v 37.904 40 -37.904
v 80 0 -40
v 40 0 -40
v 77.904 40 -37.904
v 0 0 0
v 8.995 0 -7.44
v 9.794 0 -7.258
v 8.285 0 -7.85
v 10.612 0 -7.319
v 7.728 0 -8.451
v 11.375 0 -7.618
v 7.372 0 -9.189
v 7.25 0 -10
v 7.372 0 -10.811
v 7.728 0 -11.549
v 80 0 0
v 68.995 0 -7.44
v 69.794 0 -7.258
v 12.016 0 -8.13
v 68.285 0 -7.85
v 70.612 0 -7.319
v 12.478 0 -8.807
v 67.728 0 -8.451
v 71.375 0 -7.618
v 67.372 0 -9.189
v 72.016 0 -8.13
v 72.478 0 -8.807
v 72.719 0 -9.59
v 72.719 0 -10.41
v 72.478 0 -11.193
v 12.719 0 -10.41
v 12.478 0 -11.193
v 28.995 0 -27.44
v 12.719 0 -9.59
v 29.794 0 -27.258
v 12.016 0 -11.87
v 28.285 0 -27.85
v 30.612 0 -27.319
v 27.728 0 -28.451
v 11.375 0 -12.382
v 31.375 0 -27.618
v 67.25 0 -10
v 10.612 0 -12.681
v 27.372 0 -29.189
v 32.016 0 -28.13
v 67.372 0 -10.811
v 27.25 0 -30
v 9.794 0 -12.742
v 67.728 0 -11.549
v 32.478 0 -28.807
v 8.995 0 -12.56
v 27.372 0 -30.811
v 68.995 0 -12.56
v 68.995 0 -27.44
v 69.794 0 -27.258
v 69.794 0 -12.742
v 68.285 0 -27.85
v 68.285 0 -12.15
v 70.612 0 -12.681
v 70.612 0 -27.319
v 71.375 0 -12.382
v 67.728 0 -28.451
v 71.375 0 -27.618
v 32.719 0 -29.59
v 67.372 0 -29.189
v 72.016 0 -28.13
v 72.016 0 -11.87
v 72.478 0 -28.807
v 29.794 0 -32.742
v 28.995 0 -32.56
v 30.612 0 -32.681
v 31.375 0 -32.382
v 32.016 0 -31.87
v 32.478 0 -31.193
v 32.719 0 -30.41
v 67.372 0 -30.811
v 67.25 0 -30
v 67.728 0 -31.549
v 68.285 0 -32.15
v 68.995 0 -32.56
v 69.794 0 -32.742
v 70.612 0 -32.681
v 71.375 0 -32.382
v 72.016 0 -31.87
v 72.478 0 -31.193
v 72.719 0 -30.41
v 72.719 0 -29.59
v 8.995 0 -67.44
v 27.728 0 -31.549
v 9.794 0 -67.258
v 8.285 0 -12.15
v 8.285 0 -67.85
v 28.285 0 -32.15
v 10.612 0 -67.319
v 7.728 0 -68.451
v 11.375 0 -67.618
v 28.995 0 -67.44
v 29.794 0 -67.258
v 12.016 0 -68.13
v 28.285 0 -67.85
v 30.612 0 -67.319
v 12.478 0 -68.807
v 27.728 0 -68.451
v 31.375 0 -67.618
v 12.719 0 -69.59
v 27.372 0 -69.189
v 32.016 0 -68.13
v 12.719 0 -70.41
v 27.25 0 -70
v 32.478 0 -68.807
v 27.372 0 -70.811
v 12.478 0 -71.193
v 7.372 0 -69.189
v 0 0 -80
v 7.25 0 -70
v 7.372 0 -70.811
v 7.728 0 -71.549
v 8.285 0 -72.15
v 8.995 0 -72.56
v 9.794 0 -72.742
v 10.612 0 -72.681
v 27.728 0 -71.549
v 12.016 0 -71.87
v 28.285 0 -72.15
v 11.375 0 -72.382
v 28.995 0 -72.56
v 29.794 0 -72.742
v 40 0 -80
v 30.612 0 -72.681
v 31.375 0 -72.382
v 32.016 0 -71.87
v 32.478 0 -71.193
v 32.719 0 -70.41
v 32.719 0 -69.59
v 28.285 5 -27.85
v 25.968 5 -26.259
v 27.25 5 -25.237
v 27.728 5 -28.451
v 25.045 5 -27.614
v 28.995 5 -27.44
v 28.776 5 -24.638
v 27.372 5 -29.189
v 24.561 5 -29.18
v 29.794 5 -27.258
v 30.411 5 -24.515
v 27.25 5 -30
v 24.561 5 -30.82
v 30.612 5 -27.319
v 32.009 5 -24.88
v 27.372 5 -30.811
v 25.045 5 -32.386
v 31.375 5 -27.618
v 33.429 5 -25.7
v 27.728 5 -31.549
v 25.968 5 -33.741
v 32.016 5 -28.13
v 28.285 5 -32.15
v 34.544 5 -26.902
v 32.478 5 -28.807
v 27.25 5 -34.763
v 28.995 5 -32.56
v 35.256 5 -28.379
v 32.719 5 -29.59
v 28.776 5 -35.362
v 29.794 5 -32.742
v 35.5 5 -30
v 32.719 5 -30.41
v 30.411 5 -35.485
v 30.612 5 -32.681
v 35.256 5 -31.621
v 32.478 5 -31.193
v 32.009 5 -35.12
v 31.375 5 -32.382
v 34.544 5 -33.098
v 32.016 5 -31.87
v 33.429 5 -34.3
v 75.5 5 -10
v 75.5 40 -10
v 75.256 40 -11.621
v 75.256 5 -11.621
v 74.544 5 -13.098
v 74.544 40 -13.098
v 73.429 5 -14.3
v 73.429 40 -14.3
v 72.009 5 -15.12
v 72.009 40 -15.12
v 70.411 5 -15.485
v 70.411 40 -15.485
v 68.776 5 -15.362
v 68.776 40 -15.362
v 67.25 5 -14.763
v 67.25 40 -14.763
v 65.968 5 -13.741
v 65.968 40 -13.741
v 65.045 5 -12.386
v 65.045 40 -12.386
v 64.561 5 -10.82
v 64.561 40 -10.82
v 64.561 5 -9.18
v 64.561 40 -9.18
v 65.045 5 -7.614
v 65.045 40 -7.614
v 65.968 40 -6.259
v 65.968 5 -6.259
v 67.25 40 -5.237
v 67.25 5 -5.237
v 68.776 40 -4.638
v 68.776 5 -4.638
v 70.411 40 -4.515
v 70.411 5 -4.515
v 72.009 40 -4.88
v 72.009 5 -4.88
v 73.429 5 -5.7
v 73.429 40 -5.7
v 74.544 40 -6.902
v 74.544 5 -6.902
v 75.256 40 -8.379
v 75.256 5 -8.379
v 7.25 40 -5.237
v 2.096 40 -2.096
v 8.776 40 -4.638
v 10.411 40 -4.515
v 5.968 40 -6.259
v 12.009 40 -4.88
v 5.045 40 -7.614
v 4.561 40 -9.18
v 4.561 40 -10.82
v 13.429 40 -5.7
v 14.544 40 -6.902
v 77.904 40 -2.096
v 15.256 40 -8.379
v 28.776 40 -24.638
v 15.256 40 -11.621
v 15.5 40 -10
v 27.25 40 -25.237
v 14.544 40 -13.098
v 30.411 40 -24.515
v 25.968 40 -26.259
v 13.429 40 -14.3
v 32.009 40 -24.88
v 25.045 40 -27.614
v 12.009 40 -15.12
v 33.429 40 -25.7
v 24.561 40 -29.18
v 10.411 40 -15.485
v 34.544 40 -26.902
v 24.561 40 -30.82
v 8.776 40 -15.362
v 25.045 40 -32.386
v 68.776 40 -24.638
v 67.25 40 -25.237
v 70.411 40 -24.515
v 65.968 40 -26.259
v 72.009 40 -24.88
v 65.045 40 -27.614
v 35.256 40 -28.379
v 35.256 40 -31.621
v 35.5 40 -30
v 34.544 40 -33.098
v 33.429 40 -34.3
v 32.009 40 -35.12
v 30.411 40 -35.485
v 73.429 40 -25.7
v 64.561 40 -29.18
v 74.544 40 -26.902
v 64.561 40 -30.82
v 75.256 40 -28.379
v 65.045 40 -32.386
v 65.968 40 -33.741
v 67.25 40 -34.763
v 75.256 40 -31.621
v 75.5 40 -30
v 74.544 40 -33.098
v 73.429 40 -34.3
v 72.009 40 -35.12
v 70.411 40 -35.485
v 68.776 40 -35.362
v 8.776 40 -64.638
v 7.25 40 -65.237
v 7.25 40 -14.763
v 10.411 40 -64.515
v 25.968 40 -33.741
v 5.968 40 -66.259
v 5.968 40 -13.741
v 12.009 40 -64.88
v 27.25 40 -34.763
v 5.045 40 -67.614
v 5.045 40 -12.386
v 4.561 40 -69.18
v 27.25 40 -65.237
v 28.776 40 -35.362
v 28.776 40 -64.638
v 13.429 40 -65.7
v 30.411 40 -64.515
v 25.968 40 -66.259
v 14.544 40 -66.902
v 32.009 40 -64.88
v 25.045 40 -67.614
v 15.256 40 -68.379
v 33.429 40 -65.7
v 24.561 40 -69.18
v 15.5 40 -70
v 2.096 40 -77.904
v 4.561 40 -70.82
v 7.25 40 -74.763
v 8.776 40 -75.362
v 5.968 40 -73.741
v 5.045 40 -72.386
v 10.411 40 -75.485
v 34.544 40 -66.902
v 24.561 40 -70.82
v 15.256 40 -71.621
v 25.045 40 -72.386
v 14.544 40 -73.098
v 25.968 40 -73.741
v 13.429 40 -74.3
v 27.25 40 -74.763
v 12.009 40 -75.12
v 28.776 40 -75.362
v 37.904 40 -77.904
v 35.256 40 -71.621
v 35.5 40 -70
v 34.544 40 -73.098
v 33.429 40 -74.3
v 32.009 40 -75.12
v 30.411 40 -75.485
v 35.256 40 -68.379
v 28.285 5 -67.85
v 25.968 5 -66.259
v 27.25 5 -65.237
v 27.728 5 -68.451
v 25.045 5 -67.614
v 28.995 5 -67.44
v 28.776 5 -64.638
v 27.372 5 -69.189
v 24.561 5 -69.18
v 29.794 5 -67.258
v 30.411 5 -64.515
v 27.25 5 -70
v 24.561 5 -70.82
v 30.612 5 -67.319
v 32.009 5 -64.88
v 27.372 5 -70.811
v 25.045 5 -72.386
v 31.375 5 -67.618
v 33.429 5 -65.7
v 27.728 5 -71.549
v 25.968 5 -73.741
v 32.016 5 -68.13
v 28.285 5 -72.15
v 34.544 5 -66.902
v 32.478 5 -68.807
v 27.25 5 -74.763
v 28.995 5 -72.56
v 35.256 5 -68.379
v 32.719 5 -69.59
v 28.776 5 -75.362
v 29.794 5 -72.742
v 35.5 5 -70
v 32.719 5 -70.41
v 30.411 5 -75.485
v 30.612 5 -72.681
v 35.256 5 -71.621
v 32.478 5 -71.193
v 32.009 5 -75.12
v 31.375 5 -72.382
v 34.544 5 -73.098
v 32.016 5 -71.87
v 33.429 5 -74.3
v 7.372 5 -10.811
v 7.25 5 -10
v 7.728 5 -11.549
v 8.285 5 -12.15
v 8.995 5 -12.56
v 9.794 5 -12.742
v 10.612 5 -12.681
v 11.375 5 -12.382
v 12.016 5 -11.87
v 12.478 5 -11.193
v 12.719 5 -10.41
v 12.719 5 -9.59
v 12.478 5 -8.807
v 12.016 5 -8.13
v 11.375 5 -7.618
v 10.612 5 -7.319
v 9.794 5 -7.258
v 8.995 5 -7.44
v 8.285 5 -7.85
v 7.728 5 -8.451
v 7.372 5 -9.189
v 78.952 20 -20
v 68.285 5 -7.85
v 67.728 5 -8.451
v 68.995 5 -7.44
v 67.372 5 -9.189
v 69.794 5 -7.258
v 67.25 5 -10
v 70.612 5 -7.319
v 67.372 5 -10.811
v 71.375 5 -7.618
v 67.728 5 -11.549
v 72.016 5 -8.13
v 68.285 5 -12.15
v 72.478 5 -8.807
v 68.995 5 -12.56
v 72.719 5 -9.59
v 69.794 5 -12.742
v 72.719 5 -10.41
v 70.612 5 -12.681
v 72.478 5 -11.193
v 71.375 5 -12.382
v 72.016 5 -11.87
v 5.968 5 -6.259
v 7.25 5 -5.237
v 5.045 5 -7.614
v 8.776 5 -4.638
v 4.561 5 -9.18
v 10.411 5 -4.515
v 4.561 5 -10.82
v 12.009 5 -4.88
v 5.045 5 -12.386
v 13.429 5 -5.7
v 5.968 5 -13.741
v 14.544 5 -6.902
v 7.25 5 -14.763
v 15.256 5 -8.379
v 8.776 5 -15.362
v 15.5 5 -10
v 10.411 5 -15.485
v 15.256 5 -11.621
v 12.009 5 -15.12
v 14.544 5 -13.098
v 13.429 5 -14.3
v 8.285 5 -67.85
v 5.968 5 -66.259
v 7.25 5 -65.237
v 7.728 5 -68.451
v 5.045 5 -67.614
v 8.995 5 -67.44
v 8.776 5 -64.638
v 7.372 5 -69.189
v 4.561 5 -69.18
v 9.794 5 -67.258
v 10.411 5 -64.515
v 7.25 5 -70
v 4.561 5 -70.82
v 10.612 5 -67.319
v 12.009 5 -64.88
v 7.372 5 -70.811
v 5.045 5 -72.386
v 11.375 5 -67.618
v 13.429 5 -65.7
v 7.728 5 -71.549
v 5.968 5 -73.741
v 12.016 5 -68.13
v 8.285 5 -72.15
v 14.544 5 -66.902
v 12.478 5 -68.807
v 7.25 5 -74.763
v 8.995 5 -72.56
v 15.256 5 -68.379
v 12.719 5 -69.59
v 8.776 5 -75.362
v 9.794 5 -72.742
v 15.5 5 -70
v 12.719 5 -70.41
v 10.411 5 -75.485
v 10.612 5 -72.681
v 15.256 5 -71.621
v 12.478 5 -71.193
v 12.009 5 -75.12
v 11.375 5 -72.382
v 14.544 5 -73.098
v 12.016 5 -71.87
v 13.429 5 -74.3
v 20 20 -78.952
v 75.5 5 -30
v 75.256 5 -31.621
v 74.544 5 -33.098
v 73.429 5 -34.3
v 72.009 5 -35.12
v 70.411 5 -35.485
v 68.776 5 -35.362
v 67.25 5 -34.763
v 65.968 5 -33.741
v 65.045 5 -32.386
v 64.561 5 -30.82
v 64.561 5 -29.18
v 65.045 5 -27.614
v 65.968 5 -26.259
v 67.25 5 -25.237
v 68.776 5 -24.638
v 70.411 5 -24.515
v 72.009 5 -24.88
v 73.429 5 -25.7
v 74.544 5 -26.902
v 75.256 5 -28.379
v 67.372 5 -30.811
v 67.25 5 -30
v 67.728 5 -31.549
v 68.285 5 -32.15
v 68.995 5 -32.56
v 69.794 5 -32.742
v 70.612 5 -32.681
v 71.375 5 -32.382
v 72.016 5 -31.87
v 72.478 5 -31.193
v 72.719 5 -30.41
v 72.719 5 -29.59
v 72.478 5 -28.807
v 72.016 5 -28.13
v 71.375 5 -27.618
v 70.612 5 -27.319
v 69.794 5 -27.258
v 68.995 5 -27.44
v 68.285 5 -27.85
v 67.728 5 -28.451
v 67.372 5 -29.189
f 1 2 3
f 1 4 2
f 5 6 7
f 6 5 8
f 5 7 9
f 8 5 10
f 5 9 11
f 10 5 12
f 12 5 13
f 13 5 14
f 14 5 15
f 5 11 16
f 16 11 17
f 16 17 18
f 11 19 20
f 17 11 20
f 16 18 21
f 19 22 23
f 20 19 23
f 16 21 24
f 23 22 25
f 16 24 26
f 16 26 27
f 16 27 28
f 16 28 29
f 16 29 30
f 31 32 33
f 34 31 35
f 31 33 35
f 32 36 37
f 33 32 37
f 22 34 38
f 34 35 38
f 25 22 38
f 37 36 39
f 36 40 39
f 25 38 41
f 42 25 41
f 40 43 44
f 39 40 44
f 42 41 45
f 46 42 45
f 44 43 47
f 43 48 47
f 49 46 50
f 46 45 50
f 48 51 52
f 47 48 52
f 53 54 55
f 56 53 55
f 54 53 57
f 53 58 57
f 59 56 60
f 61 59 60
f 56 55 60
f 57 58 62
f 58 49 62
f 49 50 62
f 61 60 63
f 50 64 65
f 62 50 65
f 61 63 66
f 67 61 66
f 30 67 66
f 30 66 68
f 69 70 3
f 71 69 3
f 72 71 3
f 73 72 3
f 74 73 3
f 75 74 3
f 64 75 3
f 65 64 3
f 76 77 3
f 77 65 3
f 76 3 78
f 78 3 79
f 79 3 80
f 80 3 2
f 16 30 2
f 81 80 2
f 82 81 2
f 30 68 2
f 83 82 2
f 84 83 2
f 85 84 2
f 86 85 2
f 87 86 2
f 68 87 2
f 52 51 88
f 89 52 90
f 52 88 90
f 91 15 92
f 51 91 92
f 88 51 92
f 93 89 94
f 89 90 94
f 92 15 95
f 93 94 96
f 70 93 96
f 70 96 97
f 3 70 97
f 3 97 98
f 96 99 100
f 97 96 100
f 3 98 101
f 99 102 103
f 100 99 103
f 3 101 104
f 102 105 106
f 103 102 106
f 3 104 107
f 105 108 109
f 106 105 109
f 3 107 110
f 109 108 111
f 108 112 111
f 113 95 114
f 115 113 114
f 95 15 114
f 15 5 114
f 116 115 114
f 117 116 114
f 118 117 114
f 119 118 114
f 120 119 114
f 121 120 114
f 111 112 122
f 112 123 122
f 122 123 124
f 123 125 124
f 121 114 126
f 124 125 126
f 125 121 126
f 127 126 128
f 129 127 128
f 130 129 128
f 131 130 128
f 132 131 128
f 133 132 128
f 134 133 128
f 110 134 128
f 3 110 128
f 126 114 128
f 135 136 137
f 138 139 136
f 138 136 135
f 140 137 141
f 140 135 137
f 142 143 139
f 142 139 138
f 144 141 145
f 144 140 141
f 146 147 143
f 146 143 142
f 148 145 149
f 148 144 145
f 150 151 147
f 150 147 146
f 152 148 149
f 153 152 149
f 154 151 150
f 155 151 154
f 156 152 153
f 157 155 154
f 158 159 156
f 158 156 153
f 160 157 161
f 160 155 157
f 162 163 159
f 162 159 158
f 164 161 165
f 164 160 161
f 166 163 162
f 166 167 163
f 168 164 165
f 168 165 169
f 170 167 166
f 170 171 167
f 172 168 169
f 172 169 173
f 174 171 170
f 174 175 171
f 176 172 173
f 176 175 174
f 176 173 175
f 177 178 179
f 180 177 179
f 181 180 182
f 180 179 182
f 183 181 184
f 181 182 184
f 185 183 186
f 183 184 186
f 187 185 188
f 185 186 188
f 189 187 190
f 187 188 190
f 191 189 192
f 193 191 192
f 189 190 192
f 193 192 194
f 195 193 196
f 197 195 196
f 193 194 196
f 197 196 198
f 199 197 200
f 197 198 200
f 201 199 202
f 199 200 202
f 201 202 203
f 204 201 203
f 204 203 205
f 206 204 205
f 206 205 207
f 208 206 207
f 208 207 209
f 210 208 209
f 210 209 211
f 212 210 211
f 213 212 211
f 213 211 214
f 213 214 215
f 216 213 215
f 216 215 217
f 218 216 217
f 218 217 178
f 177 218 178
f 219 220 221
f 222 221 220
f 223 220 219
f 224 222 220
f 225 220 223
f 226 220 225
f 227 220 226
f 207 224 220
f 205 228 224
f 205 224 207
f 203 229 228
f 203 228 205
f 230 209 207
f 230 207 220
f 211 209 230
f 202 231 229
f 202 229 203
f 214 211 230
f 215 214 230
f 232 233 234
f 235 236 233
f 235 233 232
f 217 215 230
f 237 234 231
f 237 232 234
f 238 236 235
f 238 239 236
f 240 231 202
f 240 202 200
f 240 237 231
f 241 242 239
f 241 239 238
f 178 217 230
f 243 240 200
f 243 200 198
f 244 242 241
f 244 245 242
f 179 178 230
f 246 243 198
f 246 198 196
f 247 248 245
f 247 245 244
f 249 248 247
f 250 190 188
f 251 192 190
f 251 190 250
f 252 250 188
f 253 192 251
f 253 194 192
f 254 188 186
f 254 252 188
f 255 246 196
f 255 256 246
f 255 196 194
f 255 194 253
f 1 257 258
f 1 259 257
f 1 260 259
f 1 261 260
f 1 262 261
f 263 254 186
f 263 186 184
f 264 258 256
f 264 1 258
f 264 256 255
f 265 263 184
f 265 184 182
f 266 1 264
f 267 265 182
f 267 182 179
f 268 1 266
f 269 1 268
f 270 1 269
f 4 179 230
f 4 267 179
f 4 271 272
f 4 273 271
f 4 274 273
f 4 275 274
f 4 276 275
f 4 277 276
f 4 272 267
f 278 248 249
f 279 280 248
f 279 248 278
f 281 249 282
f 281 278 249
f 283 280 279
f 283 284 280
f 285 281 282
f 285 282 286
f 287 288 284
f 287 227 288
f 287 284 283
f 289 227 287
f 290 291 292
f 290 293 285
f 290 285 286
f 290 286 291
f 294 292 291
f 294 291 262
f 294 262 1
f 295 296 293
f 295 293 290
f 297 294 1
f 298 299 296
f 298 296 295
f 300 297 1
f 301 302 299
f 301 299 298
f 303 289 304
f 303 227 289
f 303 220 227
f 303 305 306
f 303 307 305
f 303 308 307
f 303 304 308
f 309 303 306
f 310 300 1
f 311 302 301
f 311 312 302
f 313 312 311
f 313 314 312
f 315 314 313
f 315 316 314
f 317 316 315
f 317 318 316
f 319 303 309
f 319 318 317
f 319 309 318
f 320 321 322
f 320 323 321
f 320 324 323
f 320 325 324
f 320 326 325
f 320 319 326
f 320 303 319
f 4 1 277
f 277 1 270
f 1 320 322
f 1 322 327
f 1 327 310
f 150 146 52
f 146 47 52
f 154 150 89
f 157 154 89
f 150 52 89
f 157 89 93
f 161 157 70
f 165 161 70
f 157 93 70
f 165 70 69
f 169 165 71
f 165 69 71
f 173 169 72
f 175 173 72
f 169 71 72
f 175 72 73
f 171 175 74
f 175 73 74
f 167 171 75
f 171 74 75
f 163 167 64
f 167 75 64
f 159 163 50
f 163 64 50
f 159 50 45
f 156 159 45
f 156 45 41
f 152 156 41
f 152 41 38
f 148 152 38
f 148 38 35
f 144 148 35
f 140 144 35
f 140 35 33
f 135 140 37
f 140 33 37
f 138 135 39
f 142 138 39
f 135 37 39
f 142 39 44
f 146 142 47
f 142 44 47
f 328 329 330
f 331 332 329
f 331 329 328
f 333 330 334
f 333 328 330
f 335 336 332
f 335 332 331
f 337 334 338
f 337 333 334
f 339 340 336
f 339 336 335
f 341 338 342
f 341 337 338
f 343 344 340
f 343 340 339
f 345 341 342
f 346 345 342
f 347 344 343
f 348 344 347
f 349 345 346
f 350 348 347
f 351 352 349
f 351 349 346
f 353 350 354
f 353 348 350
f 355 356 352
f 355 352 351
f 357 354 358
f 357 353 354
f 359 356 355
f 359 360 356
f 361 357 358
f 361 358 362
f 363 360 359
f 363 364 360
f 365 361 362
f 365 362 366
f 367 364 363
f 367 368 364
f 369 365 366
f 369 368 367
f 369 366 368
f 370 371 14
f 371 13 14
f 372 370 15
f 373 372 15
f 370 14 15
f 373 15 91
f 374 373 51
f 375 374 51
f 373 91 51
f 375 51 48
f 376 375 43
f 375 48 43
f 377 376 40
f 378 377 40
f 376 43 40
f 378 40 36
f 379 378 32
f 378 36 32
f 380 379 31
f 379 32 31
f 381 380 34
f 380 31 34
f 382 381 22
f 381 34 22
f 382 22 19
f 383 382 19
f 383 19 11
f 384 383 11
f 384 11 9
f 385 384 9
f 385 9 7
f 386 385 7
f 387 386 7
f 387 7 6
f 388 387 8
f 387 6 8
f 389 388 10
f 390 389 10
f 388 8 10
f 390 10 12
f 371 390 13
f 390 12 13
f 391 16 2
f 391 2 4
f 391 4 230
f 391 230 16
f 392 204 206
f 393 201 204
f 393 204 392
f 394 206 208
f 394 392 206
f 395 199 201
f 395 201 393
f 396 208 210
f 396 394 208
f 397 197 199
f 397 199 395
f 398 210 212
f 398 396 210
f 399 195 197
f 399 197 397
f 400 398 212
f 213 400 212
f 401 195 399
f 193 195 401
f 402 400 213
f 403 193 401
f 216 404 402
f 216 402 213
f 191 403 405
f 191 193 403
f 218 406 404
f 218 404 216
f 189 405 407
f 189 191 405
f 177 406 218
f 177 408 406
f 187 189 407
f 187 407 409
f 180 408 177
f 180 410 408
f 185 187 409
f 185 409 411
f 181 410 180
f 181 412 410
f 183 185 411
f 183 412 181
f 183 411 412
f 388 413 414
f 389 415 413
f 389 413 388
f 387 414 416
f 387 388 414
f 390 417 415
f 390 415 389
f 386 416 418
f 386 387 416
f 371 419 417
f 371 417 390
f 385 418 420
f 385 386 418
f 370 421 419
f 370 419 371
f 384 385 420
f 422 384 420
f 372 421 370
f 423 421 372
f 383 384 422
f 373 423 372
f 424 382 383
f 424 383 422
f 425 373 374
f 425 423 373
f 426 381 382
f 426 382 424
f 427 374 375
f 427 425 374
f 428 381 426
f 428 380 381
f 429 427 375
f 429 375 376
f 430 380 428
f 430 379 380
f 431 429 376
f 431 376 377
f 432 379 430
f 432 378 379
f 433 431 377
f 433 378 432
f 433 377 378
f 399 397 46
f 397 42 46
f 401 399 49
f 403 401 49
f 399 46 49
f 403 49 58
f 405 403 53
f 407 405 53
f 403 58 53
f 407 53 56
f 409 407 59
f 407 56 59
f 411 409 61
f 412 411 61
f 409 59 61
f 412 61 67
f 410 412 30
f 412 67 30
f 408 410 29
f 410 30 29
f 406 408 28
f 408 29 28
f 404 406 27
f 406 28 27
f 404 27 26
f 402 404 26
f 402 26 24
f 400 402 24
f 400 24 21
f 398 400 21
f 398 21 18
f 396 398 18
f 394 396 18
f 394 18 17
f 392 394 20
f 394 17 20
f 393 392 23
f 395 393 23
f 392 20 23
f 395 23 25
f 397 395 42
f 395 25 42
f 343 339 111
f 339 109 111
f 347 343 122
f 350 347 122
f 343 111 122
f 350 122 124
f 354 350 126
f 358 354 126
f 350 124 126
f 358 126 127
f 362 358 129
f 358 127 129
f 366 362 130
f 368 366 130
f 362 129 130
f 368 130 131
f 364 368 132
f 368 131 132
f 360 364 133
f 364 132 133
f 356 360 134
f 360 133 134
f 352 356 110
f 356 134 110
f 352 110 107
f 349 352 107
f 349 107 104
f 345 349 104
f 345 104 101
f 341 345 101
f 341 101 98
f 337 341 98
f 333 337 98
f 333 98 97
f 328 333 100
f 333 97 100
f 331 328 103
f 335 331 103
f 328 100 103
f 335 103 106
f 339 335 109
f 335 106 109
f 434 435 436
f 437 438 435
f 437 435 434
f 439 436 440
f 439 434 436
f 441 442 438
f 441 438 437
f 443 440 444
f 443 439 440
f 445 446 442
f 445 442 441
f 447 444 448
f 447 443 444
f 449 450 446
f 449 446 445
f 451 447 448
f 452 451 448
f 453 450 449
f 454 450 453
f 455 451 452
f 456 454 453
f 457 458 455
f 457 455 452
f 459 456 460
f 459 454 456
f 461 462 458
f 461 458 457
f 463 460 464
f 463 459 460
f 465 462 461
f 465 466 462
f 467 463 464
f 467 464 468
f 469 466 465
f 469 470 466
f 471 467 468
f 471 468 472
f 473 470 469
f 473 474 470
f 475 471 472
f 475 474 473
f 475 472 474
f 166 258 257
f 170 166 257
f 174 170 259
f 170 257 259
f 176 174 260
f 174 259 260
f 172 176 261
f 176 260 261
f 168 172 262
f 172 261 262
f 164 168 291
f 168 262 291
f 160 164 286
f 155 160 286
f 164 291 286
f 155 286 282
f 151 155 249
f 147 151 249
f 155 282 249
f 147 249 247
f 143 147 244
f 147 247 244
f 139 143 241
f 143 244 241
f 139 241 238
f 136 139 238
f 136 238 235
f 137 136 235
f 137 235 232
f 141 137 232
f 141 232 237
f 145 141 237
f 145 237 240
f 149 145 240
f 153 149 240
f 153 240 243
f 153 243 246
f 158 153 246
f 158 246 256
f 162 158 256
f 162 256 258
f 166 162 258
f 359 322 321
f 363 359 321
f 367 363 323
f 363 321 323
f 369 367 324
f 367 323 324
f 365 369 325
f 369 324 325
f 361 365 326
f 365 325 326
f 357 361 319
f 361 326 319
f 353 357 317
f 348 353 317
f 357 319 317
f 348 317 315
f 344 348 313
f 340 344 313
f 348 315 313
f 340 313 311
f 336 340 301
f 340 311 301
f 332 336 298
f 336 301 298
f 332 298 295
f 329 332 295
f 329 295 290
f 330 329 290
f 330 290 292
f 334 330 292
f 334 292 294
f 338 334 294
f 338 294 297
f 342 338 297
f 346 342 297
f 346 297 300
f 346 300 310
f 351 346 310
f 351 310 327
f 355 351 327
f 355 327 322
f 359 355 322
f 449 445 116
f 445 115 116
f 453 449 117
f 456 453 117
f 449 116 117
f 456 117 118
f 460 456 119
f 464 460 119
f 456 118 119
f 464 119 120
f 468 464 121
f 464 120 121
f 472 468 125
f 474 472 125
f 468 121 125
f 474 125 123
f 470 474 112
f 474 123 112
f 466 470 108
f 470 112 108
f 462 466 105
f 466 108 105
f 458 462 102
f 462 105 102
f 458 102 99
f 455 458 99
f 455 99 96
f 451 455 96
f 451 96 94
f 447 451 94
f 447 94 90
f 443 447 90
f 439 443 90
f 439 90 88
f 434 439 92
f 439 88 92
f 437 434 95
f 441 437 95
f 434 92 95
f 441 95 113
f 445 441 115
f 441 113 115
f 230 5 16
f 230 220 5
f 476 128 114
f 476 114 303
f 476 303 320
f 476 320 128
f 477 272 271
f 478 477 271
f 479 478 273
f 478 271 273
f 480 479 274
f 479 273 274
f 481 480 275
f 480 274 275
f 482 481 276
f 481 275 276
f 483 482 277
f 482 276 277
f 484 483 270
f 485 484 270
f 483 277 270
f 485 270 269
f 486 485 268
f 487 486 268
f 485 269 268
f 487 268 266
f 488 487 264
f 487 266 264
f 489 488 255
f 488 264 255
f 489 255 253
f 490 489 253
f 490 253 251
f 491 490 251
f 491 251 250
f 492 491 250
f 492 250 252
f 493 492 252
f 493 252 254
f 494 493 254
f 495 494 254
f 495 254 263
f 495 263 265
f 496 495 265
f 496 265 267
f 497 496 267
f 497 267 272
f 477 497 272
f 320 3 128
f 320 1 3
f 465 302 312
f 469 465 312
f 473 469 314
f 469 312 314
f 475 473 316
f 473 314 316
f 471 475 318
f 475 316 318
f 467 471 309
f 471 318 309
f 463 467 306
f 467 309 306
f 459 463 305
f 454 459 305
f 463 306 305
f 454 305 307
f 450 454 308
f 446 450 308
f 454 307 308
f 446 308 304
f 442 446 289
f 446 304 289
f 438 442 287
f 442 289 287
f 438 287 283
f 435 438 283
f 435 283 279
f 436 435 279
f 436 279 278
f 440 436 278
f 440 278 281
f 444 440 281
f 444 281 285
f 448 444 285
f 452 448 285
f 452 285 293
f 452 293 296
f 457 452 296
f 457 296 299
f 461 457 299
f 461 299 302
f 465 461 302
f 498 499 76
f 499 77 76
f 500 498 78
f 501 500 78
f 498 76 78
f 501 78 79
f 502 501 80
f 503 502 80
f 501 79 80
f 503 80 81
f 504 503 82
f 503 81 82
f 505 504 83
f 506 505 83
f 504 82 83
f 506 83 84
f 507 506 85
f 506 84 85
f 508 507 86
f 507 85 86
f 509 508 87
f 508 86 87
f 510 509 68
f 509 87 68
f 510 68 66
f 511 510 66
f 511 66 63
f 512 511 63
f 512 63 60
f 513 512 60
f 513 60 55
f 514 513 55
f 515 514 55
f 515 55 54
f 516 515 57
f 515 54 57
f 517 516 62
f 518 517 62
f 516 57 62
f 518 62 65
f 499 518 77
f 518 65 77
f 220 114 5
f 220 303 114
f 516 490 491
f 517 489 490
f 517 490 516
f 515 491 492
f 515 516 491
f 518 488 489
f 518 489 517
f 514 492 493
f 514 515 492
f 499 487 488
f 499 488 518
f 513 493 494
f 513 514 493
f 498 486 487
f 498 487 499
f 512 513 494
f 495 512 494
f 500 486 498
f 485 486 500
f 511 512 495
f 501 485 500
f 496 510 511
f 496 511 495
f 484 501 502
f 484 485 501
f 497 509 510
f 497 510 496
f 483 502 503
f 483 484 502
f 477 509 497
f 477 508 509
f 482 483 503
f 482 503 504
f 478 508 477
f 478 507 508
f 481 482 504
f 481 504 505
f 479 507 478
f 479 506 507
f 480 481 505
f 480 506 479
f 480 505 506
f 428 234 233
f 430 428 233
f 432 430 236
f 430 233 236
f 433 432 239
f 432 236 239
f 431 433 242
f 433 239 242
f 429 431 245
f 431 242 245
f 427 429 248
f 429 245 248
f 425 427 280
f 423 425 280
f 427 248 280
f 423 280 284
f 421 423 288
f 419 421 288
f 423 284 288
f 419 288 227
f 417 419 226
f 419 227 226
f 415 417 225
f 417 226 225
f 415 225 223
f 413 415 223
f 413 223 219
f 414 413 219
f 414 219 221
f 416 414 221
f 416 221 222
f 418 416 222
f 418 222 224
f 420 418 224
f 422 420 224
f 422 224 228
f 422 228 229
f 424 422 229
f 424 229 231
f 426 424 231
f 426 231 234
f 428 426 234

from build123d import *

# Parameters (mm, degrees)
BOSS_EXTRUDE1_DEPTH             = 40
BOSS_EXTRUDE1_TAPER             = 3
CBORE_FOR_M5_SBHCS1_D           = 5.5
CBORE_FOR_M5_SBHCS1_CBORE_D     = 11
CBORE_FOR_M5_SBHCS1_CBORE_DEPTH = 35


with BuildPart() as part:
    # Sketch1 → Boss-Extrude1 (new body)
    with BuildSketch(Plane(origin=(0, 0, 0), x_dir=(1, 0, 0), z_dir=(0, 1, 0))):
        Polygon((0, 0), (80, 0), (80, 40), (40, 40), (40, 80), (0, 80), align=None)
    extrude(amount=BOSS_EXTRUDE1_DEPTH, taper=BOSS_EXTRUDE1_TAPER)

    # CBORE for M5 SBHCS1 (through all)
    with Locations(Plane(origin=(0, 40, 0), x_dir=(1, 0, 0), z_dir=(0, 1, 0))):
        with Locations((10, 70), (30, 70), (70, 30), (70, 10), (30, 30), (10, 10)):
            CounterBoreHole(CBORE_FOR_M5_SBHCS1_D / 2, CBORE_FOR_M5_SBHCS1_CBORE_D / 2, CBORE_FOR_M5_SBHCS1_CBORE_DEPTH)


solid = part.part
